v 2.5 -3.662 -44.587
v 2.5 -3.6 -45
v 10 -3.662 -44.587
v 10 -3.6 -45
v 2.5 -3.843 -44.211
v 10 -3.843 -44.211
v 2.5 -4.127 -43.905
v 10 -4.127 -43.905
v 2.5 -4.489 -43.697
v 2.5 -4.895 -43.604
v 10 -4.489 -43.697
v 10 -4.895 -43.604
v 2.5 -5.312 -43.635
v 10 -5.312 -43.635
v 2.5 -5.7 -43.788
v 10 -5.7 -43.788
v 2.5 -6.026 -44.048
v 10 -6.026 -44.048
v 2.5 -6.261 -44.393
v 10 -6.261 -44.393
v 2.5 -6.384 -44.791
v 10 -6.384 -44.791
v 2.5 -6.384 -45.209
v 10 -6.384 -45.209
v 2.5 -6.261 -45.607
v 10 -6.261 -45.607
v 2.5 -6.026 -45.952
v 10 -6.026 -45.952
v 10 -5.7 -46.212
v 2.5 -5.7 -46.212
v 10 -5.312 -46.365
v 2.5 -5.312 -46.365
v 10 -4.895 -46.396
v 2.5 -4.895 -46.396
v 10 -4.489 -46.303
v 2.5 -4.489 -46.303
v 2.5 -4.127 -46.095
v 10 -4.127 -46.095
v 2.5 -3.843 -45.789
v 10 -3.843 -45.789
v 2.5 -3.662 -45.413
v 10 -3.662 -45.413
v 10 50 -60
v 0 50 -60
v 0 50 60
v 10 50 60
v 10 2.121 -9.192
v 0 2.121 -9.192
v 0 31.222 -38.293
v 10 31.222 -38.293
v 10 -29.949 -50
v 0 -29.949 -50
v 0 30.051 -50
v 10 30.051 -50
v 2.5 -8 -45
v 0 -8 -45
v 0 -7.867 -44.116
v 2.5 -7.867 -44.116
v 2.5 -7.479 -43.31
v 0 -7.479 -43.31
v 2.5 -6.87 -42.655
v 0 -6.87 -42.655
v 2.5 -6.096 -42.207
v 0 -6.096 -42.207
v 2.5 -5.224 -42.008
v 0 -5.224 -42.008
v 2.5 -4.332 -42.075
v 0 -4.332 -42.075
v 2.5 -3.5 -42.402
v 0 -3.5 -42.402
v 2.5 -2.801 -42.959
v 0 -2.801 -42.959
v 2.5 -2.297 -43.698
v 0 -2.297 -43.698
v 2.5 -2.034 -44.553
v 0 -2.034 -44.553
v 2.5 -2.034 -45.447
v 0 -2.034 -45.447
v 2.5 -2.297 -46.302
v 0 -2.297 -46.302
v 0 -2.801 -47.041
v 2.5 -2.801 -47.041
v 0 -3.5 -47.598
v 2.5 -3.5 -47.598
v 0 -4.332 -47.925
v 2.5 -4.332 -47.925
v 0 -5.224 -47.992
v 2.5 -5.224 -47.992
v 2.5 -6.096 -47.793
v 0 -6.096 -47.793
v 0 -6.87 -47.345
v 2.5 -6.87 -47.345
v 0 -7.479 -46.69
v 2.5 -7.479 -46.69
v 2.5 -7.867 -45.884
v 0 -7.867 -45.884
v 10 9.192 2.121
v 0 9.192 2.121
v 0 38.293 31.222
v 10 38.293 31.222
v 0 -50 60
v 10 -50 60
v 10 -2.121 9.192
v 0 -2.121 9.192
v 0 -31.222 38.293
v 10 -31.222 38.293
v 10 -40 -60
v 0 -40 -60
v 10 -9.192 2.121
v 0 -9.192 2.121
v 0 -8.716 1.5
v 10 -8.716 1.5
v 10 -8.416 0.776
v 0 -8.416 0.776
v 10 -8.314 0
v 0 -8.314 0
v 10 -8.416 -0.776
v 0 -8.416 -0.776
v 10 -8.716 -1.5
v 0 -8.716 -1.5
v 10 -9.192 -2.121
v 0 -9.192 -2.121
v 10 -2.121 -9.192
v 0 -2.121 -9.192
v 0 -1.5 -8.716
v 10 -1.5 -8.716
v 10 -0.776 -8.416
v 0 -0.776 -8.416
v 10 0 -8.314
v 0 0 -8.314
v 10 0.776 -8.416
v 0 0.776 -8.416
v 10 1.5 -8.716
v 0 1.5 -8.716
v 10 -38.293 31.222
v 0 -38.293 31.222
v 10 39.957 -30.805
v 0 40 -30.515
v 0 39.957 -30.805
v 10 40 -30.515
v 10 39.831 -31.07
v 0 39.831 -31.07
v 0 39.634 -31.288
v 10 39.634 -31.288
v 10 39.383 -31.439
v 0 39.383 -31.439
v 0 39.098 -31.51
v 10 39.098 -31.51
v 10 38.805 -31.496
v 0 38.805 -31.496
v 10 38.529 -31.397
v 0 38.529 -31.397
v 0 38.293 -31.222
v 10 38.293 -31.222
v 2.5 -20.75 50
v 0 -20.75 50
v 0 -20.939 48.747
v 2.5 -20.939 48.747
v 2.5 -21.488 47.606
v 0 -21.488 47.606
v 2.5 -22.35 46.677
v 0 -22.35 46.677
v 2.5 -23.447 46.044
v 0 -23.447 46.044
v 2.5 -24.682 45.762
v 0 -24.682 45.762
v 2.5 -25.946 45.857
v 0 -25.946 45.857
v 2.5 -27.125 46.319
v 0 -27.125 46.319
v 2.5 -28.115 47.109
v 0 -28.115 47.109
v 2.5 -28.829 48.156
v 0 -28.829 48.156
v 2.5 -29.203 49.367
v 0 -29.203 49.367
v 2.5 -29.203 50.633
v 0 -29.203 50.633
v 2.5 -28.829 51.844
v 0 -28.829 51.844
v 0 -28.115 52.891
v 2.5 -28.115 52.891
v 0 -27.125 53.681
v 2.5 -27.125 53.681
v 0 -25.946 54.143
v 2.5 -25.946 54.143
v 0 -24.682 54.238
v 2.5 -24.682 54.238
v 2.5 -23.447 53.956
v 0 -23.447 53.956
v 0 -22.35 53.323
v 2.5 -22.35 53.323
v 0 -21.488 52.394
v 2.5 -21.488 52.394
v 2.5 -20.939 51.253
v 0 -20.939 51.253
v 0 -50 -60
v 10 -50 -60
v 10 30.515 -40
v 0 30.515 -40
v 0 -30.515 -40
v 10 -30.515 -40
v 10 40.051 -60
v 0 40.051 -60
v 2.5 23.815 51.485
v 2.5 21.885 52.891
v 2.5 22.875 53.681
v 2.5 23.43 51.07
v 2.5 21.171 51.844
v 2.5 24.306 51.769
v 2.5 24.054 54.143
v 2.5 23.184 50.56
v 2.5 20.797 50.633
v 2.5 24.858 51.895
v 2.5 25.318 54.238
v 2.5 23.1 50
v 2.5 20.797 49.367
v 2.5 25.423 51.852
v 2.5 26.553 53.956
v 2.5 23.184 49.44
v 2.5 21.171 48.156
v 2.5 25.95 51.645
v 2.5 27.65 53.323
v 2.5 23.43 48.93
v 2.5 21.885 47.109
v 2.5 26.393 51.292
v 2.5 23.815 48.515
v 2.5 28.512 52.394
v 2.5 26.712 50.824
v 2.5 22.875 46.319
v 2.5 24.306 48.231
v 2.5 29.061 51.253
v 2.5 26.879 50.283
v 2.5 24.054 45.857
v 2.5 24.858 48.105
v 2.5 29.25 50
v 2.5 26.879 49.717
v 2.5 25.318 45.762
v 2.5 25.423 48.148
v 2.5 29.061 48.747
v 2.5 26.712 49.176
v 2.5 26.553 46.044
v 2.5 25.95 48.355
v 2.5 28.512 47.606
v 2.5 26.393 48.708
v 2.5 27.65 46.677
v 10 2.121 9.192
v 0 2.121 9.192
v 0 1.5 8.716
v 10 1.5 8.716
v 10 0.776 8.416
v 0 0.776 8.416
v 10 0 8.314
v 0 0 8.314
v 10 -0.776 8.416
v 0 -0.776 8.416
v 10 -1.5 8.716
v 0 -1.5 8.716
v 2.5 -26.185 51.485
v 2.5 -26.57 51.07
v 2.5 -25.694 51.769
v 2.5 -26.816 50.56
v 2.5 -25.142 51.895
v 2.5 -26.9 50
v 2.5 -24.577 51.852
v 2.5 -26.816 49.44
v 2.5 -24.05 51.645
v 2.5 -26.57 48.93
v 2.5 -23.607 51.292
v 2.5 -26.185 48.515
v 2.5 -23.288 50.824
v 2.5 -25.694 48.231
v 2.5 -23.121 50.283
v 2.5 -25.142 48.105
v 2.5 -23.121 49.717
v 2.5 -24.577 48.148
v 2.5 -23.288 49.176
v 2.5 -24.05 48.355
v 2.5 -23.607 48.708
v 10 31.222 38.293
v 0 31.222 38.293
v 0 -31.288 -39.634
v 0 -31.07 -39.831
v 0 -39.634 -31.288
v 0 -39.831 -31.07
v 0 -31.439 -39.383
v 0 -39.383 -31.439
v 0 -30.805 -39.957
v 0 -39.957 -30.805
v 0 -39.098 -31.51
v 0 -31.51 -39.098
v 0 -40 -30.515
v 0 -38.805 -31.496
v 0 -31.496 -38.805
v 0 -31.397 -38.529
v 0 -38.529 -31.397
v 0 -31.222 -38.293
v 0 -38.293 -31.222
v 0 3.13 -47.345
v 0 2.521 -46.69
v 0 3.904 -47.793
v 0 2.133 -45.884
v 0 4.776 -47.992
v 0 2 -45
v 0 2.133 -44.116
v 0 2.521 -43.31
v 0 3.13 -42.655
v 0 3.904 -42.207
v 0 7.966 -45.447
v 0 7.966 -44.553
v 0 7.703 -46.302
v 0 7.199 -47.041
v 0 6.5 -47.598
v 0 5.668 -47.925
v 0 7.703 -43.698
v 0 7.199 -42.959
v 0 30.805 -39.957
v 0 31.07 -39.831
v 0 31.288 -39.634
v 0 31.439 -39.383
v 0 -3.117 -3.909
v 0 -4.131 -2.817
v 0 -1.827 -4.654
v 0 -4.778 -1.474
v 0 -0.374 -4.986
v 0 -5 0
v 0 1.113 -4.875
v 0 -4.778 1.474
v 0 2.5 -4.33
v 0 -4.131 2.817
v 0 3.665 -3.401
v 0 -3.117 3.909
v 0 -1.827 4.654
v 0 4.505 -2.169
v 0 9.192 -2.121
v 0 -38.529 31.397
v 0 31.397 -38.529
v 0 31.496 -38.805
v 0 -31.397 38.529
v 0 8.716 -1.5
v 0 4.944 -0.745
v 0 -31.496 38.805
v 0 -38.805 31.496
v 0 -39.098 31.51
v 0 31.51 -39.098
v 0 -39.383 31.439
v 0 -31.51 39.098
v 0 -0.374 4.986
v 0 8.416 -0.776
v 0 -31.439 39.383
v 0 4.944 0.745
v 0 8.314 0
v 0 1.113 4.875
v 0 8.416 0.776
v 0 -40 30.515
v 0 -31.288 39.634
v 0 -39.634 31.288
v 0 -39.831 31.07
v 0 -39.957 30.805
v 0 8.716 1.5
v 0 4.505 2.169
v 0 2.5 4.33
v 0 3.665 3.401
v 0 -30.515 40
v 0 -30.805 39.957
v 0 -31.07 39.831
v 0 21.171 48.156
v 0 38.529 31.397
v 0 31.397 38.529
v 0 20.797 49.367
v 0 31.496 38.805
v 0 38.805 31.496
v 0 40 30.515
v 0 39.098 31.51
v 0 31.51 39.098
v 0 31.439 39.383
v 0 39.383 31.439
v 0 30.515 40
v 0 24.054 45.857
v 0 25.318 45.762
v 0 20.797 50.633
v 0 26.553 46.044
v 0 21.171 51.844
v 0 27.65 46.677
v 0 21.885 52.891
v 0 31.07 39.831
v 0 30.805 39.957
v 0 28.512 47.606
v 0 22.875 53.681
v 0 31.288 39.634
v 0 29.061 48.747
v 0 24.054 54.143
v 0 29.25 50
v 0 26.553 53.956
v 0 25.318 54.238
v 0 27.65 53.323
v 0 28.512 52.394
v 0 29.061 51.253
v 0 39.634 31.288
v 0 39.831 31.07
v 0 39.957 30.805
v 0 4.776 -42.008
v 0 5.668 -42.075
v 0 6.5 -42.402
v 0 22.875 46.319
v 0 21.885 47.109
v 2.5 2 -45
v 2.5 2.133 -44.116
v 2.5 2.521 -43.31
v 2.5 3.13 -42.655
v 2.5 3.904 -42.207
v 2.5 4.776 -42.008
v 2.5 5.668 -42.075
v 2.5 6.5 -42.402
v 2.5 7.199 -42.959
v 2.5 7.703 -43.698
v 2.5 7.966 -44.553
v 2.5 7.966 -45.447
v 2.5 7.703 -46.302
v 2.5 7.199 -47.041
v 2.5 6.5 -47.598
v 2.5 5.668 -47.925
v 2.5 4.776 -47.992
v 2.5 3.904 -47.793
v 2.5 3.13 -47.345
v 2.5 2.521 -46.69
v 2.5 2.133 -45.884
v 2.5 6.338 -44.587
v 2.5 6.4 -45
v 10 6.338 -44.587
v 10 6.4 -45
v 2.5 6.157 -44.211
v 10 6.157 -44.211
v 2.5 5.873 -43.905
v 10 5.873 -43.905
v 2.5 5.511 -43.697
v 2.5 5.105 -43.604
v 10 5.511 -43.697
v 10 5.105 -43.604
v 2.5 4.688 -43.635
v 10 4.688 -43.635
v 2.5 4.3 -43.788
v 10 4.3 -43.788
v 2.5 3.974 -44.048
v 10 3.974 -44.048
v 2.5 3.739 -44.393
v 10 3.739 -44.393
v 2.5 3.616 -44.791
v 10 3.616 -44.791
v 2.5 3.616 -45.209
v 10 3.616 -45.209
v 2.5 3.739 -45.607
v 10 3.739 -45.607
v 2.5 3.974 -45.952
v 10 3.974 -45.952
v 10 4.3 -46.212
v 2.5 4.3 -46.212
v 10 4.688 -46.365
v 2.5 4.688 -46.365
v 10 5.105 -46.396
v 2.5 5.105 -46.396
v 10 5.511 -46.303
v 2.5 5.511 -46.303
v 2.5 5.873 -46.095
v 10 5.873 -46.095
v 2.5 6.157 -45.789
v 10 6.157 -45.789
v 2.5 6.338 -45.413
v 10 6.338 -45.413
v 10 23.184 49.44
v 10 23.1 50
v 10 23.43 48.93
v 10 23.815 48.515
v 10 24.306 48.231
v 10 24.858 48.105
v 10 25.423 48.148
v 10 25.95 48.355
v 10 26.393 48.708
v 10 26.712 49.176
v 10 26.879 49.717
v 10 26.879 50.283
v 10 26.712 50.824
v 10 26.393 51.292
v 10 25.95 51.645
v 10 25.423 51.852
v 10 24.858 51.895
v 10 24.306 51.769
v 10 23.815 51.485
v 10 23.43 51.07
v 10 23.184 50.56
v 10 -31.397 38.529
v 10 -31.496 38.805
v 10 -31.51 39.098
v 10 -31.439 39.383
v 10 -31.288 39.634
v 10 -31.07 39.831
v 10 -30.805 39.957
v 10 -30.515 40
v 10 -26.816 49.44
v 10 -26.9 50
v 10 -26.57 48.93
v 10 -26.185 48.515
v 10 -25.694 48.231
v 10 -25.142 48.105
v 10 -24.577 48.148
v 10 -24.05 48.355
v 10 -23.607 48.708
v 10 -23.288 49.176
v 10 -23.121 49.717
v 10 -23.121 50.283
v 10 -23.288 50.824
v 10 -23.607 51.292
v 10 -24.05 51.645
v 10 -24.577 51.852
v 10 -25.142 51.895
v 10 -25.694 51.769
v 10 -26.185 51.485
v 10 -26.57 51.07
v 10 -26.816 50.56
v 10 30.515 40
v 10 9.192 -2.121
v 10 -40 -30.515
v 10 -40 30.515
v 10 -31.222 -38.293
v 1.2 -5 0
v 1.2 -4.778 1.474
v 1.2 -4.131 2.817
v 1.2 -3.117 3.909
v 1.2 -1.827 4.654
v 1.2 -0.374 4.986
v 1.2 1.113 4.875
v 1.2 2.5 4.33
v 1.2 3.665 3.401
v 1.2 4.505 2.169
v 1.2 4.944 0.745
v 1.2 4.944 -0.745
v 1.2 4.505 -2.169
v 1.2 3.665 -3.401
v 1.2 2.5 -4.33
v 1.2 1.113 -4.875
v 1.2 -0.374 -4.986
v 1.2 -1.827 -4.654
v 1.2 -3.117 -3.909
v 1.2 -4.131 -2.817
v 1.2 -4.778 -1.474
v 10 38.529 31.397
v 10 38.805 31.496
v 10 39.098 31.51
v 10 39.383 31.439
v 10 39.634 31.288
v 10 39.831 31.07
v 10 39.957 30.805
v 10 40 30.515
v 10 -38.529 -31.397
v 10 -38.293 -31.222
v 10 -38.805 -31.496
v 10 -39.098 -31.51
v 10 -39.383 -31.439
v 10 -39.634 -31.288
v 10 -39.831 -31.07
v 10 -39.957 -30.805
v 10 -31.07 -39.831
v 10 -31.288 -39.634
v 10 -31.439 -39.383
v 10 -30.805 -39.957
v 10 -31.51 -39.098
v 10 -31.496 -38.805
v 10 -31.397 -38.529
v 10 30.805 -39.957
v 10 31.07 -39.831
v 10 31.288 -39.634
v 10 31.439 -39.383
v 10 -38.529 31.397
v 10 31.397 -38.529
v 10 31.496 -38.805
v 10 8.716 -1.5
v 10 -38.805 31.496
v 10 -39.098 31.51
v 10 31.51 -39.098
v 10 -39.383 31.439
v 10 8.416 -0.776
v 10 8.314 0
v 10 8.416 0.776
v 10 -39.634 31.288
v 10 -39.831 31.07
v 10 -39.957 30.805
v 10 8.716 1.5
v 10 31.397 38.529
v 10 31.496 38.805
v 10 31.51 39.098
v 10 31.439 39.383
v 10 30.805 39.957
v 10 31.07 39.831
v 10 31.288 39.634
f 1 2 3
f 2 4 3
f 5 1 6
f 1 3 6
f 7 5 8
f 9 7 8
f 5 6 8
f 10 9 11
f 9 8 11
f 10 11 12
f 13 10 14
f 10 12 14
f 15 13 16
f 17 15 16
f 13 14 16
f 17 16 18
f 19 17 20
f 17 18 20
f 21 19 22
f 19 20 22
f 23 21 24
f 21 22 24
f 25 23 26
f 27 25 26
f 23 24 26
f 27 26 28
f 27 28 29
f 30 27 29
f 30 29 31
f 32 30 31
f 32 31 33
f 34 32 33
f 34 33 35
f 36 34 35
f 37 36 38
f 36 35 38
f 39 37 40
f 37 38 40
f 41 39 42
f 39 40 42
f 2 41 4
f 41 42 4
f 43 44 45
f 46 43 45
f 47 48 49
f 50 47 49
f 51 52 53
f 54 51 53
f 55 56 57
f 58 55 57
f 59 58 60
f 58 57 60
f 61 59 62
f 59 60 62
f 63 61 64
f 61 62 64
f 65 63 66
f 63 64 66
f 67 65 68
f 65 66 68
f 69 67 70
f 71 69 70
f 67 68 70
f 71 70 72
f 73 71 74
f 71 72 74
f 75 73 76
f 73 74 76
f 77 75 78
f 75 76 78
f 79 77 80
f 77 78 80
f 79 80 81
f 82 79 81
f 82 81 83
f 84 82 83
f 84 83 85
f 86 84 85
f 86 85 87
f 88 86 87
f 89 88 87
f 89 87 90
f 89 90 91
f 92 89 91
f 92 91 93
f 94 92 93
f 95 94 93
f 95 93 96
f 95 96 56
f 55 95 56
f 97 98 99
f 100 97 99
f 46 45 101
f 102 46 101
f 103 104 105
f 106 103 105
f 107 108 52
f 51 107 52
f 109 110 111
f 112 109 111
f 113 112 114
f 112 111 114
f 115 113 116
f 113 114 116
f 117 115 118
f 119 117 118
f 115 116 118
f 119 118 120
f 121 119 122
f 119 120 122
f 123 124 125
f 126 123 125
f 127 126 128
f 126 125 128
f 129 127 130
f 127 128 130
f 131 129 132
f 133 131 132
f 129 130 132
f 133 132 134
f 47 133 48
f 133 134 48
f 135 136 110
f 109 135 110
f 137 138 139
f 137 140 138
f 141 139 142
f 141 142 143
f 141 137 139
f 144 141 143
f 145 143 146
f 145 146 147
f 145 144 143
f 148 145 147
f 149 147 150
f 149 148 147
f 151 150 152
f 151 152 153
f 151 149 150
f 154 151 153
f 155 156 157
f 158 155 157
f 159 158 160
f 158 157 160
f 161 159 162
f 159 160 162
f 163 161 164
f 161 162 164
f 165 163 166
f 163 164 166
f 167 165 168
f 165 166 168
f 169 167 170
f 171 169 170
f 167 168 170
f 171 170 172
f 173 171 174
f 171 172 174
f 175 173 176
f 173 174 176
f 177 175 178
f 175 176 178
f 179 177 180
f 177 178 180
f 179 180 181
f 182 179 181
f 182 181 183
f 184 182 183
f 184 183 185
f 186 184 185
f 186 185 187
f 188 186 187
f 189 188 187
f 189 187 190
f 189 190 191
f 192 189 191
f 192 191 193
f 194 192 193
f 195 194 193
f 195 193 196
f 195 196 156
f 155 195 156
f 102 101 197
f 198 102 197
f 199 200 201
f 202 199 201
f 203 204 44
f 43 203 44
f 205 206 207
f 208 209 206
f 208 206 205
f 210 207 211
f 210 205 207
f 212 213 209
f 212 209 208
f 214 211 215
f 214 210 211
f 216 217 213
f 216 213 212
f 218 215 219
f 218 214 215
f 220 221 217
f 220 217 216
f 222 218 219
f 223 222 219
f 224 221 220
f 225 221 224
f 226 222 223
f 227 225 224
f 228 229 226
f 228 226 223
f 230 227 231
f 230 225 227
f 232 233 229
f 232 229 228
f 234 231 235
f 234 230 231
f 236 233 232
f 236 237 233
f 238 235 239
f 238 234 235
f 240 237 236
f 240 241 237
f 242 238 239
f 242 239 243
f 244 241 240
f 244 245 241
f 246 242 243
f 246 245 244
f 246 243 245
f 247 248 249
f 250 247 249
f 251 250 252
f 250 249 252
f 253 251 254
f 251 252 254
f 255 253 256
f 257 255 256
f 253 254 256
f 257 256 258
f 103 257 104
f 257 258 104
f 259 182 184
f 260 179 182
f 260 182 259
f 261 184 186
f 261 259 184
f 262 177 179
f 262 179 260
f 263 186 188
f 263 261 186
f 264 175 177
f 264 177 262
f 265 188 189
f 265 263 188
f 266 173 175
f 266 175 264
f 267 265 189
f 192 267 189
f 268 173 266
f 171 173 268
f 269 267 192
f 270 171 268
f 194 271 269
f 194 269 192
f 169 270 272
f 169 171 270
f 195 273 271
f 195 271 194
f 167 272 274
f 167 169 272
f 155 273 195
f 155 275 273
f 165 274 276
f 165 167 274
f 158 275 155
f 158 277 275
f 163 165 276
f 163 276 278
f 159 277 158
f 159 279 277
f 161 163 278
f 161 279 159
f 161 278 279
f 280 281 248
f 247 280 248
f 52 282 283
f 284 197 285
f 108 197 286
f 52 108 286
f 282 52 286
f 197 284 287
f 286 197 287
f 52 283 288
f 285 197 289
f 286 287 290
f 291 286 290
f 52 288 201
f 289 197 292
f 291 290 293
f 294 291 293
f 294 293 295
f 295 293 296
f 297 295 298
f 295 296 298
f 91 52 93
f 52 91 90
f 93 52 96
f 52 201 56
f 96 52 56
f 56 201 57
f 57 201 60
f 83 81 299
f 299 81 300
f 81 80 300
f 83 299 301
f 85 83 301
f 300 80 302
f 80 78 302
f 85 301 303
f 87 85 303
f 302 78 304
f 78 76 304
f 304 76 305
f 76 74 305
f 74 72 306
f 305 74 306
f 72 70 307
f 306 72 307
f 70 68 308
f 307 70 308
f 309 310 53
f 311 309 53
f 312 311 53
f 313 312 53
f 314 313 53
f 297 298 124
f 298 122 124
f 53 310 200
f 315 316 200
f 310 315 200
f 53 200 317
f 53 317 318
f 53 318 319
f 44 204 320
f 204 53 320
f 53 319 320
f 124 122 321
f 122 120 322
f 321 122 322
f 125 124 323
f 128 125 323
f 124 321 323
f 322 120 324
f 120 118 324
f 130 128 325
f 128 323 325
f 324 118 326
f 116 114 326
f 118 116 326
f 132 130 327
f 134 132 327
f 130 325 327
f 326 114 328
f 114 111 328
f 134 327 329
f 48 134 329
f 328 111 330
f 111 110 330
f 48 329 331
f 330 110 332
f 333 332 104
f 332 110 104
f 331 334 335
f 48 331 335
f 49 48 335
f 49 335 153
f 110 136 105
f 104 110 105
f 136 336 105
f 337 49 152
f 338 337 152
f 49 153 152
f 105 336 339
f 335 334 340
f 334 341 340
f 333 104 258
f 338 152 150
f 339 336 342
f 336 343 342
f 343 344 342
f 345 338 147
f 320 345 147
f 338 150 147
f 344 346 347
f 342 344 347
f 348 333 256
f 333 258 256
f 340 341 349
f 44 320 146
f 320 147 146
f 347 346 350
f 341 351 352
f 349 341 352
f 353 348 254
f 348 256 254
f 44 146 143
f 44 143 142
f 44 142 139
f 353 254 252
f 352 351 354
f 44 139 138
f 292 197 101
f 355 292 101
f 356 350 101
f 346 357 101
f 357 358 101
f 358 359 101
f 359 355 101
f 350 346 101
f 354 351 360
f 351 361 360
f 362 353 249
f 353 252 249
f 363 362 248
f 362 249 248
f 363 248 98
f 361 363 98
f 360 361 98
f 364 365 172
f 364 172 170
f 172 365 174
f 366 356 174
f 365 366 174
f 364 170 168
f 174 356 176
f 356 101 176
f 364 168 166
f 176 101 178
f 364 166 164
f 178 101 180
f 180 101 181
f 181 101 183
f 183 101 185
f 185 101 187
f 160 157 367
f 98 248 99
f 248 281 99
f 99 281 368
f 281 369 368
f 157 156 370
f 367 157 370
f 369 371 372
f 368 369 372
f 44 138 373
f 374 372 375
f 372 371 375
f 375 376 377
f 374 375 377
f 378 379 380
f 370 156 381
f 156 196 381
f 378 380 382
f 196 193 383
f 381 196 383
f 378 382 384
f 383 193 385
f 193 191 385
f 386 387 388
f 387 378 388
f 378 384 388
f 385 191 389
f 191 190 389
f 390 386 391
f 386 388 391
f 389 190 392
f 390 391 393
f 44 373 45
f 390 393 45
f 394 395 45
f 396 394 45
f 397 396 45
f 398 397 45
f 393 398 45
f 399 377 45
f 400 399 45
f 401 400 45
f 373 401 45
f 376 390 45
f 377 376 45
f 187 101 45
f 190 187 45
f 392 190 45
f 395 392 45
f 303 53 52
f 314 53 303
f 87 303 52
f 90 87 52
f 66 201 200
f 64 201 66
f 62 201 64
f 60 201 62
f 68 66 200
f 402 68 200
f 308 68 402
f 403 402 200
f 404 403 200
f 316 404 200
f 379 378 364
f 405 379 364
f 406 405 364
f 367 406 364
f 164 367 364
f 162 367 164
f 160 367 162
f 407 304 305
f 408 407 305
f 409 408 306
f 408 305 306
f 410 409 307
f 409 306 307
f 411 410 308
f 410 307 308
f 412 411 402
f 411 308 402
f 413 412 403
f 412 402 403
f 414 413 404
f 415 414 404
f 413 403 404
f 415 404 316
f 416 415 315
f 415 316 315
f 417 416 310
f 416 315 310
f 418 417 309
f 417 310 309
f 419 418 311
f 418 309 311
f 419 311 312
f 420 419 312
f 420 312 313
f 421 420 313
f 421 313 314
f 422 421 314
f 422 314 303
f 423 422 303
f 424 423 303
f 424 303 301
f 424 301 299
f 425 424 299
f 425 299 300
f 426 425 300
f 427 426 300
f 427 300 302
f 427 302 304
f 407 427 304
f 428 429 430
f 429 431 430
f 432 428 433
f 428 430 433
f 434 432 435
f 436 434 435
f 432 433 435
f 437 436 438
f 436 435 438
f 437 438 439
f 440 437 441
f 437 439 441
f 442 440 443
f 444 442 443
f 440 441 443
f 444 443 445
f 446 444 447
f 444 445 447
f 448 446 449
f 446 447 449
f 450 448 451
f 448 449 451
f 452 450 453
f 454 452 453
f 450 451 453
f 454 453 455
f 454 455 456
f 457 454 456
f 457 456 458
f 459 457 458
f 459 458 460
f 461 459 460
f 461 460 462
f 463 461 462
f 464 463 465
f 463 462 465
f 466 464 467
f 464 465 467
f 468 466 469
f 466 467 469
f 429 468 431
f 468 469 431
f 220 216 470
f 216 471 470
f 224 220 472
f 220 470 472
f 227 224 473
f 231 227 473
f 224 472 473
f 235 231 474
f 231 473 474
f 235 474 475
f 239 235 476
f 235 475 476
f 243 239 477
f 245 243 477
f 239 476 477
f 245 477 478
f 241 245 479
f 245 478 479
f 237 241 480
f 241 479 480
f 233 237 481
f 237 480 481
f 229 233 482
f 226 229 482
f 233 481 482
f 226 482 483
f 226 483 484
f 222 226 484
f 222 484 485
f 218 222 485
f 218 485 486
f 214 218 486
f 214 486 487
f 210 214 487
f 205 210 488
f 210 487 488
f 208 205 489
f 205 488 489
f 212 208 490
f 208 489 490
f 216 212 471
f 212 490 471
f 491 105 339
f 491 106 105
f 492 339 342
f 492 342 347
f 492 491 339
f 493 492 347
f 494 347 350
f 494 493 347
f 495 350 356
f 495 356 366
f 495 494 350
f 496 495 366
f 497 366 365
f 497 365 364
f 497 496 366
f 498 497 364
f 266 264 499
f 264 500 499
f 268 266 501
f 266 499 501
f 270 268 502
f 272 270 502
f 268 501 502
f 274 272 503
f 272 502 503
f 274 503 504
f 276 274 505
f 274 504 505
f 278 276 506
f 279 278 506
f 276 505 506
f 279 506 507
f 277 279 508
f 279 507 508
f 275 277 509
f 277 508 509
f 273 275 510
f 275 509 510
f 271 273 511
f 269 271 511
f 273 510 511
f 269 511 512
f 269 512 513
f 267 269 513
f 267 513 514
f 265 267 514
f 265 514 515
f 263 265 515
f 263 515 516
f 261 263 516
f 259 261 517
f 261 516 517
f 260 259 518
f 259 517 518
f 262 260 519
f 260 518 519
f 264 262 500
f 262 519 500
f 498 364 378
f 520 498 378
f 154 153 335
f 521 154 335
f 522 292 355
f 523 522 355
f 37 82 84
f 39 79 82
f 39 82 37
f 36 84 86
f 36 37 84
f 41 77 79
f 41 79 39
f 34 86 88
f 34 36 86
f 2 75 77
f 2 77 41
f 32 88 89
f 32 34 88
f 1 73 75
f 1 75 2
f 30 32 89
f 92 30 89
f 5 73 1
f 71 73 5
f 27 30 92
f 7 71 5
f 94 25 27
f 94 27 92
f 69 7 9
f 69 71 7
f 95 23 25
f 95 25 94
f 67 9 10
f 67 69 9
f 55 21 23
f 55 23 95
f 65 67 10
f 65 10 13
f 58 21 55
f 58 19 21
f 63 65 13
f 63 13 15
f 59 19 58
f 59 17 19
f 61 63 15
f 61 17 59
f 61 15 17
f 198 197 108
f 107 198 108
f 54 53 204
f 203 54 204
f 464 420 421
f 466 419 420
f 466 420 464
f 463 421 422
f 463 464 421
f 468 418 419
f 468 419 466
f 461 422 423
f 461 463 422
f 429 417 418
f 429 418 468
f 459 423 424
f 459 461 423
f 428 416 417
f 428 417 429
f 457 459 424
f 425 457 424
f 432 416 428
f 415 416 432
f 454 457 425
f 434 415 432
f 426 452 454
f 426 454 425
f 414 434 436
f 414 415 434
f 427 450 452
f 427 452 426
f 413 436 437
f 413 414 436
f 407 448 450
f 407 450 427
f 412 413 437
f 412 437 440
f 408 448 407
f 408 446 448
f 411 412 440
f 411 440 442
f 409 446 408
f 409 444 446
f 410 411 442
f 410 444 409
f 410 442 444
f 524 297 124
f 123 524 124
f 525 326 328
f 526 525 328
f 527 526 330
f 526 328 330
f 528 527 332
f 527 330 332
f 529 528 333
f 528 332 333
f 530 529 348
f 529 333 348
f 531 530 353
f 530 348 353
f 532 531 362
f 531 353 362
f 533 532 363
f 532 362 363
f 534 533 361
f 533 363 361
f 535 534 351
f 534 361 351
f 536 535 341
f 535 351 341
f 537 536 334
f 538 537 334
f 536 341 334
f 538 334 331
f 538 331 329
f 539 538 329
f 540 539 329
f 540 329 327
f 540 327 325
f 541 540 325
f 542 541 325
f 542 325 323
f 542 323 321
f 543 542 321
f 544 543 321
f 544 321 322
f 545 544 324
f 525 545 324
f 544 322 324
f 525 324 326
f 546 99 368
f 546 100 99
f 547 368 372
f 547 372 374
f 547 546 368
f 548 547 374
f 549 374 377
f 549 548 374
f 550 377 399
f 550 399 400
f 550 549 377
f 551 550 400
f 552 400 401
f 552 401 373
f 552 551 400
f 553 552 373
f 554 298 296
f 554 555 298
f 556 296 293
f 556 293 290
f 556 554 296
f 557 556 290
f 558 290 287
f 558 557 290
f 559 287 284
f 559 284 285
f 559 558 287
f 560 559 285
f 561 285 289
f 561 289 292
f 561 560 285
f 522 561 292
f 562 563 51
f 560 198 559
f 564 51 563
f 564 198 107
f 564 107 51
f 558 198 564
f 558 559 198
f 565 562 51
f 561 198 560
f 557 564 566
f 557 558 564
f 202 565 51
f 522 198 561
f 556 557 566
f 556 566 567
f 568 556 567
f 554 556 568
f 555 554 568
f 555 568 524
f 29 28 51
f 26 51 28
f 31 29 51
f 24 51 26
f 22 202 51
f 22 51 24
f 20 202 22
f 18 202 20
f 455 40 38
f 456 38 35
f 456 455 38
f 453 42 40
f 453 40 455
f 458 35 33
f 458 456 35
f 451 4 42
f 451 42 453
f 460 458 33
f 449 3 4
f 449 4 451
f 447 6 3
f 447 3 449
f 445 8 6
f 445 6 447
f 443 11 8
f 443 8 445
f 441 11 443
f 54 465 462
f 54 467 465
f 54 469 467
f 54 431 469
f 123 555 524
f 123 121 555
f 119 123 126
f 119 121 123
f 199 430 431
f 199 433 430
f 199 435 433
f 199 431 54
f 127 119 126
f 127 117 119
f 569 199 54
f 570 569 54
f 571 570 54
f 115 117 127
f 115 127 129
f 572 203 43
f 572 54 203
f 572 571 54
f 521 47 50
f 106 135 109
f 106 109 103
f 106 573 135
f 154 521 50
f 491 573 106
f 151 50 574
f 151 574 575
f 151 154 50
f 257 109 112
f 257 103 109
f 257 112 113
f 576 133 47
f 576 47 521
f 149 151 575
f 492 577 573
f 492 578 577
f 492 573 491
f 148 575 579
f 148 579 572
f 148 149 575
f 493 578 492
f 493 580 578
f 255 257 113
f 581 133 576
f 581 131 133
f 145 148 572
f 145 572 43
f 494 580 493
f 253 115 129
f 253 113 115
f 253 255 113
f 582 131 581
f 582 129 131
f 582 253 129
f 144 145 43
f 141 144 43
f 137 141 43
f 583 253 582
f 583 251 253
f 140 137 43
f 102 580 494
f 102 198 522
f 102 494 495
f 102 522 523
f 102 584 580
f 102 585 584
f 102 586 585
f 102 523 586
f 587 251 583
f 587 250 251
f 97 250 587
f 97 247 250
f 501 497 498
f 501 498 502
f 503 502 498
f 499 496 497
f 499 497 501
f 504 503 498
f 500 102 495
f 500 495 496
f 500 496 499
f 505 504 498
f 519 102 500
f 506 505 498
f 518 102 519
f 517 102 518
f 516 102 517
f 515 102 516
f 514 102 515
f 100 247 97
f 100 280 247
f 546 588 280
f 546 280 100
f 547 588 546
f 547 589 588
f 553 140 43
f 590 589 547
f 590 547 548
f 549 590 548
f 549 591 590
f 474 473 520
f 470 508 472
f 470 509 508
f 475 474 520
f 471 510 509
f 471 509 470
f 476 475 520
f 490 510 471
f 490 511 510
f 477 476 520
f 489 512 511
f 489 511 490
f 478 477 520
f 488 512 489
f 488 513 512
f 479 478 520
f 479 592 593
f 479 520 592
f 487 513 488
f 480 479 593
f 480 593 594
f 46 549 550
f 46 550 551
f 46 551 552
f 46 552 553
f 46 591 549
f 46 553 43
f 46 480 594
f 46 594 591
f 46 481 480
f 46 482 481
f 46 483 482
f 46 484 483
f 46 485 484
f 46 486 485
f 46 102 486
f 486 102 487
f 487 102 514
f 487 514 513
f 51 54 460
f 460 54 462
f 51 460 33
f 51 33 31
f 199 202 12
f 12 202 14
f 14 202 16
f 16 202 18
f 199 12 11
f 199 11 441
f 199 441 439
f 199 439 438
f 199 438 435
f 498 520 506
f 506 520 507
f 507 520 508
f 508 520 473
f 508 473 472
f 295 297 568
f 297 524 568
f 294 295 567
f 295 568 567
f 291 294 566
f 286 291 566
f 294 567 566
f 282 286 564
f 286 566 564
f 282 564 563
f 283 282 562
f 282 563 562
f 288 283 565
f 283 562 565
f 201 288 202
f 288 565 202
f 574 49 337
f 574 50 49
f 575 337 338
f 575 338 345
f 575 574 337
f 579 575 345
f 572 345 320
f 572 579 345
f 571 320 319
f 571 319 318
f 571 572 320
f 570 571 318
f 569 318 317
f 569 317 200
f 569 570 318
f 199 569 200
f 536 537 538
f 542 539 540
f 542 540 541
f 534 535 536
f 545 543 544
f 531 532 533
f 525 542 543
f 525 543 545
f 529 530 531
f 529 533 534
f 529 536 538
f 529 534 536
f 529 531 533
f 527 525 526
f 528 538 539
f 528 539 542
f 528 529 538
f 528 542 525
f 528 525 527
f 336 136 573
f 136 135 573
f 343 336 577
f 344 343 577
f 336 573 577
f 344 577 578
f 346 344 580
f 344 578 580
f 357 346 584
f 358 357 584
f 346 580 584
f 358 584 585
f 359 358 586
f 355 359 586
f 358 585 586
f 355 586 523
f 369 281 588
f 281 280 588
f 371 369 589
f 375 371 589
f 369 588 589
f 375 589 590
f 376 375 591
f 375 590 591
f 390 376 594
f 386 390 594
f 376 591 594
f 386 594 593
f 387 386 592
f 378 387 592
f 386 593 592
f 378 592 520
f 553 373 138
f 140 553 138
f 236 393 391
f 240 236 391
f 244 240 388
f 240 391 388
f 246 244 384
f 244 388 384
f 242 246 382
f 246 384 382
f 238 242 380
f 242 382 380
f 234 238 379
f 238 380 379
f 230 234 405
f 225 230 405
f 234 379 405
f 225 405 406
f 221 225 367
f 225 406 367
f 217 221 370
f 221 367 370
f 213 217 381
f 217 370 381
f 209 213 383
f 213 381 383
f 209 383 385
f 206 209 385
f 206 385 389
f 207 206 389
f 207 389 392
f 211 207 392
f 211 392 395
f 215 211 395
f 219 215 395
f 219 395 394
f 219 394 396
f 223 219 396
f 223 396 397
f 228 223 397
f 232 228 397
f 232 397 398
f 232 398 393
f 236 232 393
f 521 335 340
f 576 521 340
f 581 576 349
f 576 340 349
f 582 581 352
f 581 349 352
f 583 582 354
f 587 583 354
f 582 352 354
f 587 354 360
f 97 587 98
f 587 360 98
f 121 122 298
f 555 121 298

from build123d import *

# Parameters (mm, degrees)
F1_DEPTH       = 10
F2_R           = 1
F3_D           = 3.8
F3_CBORE_D     = 8.5
F3_CBORE_DEPTH = 2.5
F4_R           = 5
F5_DEPTH       = 1.2
F8_D           = 2.8
F8_CBORE_D     = 6
F8_CBORE_DEPTH = 2.5


with BuildPart() as f1:
    # F0 (on Right) → F1 (new body)
    with BuildSketch(Plane.YZ):
        Polygon((40.0512183458, -60), (50, -60), (50, 60), (-50, 60), (-50, -60), (-40, -60), (-29.9487816542, -50), (30.0512183458, -50), align=None)
        with BuildLine():
            Line((2.1213203436, -9.1923881554), (32.9289321881, -40))
            Line((32.9289321881, -40), (-32.9289321881, -40))
            Line((-32.9289321881, -40), (-2.1213203436, -9.1923881554))
            ThreePointArc((-2.1213203436, -9.1923881554), (0, -8.313708499), (2.1213203436, -9.1923881554))
        make_face(mode=Mode.SUBTRACT)
        with BuildLine():
            Line((-9.1923881554, -2.1213203436), (-40, -32.9289321881))
            Line((-40, -32.9289321881), (-40, 32.9289321881))
            Line((-40, 32.9289321881), (-9.1923881554, 2.1213203436))
            ThreePointArc((-9.1923881554, 2.1213203436), (-8.313708499, 0), (-9.1923881554, -2.1213203436))
        make_face(mode=Mode.SUBTRACT)
        with BuildLine():
            Line((40, 32.9289321881), (40, -32.9289321881))
            Line((40, -32.9289321881), (9.1923881554, -2.1213203436))
            ThreePointArc((9.1923881554, -2.1213203436), (8.313708499, 0), (9.1923881554, 2.1213203436))
            Line((9.1923881554, 2.1213203436), (40, 32.9289321881))
        make_face(mode=Mode.SUBTRACT)
        with BuildLine():
            Line((-32.9289321881, 40), (32.9289321881, 40))
            Line((32.9289321881, 40), (2.1213203436, 9.1923881554))
            ThreePointArc((2.1213203436, 9.1923881554), (0, 8.313708499), (-2.1213203436, 9.1923881554))
            Line((-2.1213203436, 9.1923881554), (-32.9289321881, 40))
        make_face(mode=Mode.SUBTRACT)
    extrude(amount=F1_DEPTH)

    # F2
    f2_edges = [f1.edges().sort_by_distance(p)[0] for p in [
        (5, -32.928932, 40),
        (5, 32.928932, 40),
        (5, -40, 32.928932),
        (5, -40, -32.928932),
        (5, -32.928932, -40),
        (5, 40, 32.928932),
        (5, 40, -32.928932),
        (5, 32.928932, -40),
    ]]
    fillet(f2_edges, radius=F2_R)

    # F3 (through all)
    with Locations(Plane(origin=(0, 0, 0), x_dir=(0, 1, 0), z_dir=(-1, 0, 0))):
        with Locations((-25, -50), (25, -50)):
            CounterBoreHole(F3_D / 2, F3_CBORE_D / 2, F3_CBORE_DEPTH)

    # F4 (on face) → F5 (cut)
    with BuildSketch(Plane(origin=(0, 0, 0), x_dir=(0, -1, 0), z_dir=(-1, 0, 0))):
        Circle(F4_R)
    extrude(amount=-F5_DEPTH, mode=Mode.SUBTRACT)

    # F8 (through all)
    with Locations(Plane(origin=(0, 0, 0), x_dir=(0, -1, 0), z_dir=(-1, 0, 0))):
        with Locations((-5, -45), (5, -45)):
            CounterBoreHole(F8_D / 2, F8_CBORE_D / 2, F8_CBORE_DEPTH)


solid = f1.part
